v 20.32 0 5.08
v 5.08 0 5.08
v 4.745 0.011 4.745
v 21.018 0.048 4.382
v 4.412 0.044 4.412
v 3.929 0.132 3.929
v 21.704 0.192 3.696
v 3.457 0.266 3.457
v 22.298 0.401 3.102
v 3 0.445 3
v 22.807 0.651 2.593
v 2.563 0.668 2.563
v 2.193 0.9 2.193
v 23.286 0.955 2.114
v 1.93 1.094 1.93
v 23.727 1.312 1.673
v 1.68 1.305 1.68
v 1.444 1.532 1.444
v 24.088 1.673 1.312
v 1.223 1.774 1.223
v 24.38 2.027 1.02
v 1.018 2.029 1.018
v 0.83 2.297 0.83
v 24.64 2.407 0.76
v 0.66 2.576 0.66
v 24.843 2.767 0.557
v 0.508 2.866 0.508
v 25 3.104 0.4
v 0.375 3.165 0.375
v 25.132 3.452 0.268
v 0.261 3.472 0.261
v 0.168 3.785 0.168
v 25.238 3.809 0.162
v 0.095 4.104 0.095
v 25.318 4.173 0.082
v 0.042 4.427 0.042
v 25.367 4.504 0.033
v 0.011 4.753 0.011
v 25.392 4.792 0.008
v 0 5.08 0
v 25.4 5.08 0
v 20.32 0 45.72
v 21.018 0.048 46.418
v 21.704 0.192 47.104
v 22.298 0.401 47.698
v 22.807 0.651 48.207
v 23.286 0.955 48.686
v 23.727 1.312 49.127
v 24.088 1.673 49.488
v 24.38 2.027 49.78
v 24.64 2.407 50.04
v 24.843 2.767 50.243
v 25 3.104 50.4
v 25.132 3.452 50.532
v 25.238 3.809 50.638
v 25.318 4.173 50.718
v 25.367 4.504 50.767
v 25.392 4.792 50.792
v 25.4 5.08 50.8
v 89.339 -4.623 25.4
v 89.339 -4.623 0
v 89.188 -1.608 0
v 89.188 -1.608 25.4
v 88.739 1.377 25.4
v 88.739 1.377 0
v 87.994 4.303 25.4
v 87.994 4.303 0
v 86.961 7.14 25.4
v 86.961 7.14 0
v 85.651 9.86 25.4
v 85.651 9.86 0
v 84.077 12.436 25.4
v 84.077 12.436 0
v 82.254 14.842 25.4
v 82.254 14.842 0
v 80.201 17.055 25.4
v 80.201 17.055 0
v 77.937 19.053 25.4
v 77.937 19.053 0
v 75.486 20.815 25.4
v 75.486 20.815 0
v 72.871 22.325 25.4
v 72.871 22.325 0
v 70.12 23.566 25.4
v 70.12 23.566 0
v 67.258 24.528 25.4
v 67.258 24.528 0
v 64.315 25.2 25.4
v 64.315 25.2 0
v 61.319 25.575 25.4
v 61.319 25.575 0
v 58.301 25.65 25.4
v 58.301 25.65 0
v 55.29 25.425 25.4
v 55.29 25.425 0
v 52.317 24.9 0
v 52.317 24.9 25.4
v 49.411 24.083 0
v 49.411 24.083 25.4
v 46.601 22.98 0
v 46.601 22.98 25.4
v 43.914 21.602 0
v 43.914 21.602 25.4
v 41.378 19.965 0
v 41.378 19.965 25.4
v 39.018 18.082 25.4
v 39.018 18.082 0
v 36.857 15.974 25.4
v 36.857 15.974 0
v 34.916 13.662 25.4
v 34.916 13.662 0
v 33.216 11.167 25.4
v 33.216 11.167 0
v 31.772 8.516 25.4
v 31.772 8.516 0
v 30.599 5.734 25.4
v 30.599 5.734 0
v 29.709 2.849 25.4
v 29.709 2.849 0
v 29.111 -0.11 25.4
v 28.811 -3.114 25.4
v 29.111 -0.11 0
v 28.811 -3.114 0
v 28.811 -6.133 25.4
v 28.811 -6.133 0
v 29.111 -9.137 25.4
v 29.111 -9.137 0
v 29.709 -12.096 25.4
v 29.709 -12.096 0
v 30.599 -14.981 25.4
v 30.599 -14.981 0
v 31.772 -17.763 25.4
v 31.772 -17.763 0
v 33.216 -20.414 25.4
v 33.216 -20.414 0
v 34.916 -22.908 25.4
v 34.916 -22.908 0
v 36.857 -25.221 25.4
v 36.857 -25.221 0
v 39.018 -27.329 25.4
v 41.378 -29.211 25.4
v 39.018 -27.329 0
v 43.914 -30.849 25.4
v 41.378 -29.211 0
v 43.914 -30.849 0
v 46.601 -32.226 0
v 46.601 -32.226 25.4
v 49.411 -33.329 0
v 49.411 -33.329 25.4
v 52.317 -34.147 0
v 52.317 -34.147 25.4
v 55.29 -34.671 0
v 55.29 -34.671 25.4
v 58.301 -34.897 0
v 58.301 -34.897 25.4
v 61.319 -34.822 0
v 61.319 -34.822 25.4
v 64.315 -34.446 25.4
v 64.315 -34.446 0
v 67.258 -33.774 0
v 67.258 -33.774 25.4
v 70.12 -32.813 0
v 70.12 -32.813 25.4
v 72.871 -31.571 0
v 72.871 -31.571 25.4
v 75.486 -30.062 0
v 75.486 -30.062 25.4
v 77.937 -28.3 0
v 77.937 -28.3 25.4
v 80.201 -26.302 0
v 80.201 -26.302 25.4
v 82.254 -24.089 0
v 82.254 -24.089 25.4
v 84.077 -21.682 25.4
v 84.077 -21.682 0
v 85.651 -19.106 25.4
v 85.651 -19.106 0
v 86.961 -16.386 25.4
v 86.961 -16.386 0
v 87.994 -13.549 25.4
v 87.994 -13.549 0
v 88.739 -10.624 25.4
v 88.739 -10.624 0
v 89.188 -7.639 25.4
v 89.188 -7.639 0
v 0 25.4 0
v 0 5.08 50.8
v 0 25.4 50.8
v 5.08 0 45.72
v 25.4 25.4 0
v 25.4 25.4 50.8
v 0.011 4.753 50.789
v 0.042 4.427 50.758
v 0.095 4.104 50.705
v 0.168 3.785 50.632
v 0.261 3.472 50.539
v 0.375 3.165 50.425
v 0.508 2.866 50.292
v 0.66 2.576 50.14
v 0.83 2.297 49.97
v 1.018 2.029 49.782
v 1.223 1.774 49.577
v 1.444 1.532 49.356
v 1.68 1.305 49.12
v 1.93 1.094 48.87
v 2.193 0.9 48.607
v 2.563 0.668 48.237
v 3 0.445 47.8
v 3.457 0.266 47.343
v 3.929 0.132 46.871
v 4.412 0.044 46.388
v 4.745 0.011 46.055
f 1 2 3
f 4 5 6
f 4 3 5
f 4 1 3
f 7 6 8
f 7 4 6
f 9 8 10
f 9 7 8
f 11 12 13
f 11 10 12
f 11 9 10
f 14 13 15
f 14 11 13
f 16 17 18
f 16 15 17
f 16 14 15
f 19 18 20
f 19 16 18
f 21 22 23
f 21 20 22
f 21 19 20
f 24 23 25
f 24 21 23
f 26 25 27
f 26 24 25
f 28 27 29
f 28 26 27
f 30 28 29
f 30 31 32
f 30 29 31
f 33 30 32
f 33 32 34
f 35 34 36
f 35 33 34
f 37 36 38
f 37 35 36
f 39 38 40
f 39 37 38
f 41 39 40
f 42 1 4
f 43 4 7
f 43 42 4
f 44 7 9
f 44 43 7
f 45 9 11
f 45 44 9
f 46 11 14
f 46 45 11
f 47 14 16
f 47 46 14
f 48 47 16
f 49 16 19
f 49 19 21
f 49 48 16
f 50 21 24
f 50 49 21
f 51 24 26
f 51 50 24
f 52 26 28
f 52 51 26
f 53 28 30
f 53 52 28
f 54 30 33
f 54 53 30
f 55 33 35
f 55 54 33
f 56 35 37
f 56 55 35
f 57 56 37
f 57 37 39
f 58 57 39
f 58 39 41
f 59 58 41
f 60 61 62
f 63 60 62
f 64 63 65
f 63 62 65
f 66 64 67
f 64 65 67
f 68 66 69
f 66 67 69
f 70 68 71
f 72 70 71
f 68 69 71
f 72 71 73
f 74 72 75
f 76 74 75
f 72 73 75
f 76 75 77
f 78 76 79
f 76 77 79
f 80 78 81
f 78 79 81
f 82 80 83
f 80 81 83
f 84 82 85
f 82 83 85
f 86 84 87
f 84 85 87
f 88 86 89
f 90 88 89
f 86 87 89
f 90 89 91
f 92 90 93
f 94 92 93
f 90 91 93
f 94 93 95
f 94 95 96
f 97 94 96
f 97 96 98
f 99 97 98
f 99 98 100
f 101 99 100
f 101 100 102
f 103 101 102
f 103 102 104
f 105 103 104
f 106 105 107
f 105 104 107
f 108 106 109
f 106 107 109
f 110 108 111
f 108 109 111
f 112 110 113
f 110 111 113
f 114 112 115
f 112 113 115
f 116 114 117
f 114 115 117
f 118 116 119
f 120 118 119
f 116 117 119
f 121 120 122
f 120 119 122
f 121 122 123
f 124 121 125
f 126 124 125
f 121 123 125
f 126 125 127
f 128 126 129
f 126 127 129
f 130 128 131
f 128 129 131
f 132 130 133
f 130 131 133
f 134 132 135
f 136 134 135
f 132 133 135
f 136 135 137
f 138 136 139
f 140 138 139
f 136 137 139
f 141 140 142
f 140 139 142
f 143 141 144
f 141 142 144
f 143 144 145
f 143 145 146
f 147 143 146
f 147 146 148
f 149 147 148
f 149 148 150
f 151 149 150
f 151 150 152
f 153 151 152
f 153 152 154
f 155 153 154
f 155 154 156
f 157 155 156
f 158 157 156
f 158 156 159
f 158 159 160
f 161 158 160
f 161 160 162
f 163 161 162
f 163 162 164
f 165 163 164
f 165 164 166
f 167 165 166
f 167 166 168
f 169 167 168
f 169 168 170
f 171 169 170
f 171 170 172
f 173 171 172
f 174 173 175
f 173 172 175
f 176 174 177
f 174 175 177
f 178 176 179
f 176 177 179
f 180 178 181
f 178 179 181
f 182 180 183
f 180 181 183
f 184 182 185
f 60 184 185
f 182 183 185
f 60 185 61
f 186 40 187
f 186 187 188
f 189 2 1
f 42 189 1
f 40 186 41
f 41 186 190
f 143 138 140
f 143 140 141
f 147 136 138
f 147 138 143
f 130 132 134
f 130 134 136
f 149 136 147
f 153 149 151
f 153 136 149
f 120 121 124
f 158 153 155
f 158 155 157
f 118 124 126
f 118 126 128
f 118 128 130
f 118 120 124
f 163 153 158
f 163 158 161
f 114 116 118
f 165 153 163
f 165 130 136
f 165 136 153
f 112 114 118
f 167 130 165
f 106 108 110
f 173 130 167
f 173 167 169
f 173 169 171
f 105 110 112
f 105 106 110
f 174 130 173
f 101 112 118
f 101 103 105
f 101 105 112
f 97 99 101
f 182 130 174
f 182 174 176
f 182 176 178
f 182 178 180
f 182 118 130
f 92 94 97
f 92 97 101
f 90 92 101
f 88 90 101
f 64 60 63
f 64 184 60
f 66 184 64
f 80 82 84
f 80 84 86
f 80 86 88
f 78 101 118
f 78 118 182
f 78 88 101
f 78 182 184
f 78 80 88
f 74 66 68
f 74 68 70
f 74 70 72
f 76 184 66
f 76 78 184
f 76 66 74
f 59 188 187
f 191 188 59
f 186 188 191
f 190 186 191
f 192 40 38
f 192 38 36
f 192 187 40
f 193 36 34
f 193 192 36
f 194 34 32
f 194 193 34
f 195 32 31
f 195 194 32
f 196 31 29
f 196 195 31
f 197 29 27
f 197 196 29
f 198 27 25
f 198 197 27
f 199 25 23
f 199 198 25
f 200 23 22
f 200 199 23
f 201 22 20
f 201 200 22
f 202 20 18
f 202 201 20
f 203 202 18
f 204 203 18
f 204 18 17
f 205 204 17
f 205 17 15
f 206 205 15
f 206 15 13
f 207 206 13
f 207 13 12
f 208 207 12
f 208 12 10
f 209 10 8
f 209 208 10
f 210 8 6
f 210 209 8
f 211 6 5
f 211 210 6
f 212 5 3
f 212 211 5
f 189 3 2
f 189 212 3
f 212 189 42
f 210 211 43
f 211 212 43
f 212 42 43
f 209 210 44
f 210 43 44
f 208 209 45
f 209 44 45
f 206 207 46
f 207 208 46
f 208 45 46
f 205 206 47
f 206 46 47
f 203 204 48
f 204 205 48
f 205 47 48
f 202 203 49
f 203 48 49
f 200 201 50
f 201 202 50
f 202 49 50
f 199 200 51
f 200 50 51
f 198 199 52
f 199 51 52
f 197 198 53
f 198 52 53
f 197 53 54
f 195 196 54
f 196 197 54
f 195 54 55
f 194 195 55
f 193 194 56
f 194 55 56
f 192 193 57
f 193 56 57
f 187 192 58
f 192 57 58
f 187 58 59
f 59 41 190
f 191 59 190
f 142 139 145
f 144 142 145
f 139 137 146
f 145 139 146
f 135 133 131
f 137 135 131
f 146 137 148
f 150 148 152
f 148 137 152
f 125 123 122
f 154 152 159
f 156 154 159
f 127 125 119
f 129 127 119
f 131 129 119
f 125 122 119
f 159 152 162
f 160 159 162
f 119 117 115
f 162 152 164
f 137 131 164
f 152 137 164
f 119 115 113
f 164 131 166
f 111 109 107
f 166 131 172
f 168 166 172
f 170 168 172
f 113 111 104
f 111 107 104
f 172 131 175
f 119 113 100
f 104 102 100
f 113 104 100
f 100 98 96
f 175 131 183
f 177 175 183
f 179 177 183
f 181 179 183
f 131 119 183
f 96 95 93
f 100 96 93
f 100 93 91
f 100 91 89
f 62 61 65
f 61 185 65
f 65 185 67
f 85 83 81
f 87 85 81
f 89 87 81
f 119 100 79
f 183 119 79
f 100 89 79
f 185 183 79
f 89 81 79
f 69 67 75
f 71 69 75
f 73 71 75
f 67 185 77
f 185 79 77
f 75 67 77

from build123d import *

# Parameters (mm, degrees)
F0_W     = 25.4
F0_H     = 25.4
F1_DEPTH = 50.8
F2_R     = 5.08
F3_R     = 30.282967
F4_DEPTH = 25.4


with BuildPart() as f1:
    # F0 (on Top) → F1 (new body)
    with BuildSketch(Plane.XY):
        with Locations((12.7, 12.7)):
            Rectangle(F0_W, F0_H)
    extrude(amount=F1_DEPTH)

    # F2
    f2_edges = [f1.edges().sort_by_distance(p)[0] for p in [
        (0, 0, 25.4),
        (25.4, 0, 25.4),
        (12.7, 0, 0),
        (12.7, 0, 50.8),
    ]]
    fillet(f2_edges, radius=F2_R)


with BuildPart() as f4:
    # F3 (on Top) → F4 (new body)
    with BuildSketch(Plane.XY):
        with Locations((59.055977, -4.623331)):
            Circle(F3_R)
    extrude(amount=F4_DEPTH)


solid = Compound([f1.part, f4.part])
